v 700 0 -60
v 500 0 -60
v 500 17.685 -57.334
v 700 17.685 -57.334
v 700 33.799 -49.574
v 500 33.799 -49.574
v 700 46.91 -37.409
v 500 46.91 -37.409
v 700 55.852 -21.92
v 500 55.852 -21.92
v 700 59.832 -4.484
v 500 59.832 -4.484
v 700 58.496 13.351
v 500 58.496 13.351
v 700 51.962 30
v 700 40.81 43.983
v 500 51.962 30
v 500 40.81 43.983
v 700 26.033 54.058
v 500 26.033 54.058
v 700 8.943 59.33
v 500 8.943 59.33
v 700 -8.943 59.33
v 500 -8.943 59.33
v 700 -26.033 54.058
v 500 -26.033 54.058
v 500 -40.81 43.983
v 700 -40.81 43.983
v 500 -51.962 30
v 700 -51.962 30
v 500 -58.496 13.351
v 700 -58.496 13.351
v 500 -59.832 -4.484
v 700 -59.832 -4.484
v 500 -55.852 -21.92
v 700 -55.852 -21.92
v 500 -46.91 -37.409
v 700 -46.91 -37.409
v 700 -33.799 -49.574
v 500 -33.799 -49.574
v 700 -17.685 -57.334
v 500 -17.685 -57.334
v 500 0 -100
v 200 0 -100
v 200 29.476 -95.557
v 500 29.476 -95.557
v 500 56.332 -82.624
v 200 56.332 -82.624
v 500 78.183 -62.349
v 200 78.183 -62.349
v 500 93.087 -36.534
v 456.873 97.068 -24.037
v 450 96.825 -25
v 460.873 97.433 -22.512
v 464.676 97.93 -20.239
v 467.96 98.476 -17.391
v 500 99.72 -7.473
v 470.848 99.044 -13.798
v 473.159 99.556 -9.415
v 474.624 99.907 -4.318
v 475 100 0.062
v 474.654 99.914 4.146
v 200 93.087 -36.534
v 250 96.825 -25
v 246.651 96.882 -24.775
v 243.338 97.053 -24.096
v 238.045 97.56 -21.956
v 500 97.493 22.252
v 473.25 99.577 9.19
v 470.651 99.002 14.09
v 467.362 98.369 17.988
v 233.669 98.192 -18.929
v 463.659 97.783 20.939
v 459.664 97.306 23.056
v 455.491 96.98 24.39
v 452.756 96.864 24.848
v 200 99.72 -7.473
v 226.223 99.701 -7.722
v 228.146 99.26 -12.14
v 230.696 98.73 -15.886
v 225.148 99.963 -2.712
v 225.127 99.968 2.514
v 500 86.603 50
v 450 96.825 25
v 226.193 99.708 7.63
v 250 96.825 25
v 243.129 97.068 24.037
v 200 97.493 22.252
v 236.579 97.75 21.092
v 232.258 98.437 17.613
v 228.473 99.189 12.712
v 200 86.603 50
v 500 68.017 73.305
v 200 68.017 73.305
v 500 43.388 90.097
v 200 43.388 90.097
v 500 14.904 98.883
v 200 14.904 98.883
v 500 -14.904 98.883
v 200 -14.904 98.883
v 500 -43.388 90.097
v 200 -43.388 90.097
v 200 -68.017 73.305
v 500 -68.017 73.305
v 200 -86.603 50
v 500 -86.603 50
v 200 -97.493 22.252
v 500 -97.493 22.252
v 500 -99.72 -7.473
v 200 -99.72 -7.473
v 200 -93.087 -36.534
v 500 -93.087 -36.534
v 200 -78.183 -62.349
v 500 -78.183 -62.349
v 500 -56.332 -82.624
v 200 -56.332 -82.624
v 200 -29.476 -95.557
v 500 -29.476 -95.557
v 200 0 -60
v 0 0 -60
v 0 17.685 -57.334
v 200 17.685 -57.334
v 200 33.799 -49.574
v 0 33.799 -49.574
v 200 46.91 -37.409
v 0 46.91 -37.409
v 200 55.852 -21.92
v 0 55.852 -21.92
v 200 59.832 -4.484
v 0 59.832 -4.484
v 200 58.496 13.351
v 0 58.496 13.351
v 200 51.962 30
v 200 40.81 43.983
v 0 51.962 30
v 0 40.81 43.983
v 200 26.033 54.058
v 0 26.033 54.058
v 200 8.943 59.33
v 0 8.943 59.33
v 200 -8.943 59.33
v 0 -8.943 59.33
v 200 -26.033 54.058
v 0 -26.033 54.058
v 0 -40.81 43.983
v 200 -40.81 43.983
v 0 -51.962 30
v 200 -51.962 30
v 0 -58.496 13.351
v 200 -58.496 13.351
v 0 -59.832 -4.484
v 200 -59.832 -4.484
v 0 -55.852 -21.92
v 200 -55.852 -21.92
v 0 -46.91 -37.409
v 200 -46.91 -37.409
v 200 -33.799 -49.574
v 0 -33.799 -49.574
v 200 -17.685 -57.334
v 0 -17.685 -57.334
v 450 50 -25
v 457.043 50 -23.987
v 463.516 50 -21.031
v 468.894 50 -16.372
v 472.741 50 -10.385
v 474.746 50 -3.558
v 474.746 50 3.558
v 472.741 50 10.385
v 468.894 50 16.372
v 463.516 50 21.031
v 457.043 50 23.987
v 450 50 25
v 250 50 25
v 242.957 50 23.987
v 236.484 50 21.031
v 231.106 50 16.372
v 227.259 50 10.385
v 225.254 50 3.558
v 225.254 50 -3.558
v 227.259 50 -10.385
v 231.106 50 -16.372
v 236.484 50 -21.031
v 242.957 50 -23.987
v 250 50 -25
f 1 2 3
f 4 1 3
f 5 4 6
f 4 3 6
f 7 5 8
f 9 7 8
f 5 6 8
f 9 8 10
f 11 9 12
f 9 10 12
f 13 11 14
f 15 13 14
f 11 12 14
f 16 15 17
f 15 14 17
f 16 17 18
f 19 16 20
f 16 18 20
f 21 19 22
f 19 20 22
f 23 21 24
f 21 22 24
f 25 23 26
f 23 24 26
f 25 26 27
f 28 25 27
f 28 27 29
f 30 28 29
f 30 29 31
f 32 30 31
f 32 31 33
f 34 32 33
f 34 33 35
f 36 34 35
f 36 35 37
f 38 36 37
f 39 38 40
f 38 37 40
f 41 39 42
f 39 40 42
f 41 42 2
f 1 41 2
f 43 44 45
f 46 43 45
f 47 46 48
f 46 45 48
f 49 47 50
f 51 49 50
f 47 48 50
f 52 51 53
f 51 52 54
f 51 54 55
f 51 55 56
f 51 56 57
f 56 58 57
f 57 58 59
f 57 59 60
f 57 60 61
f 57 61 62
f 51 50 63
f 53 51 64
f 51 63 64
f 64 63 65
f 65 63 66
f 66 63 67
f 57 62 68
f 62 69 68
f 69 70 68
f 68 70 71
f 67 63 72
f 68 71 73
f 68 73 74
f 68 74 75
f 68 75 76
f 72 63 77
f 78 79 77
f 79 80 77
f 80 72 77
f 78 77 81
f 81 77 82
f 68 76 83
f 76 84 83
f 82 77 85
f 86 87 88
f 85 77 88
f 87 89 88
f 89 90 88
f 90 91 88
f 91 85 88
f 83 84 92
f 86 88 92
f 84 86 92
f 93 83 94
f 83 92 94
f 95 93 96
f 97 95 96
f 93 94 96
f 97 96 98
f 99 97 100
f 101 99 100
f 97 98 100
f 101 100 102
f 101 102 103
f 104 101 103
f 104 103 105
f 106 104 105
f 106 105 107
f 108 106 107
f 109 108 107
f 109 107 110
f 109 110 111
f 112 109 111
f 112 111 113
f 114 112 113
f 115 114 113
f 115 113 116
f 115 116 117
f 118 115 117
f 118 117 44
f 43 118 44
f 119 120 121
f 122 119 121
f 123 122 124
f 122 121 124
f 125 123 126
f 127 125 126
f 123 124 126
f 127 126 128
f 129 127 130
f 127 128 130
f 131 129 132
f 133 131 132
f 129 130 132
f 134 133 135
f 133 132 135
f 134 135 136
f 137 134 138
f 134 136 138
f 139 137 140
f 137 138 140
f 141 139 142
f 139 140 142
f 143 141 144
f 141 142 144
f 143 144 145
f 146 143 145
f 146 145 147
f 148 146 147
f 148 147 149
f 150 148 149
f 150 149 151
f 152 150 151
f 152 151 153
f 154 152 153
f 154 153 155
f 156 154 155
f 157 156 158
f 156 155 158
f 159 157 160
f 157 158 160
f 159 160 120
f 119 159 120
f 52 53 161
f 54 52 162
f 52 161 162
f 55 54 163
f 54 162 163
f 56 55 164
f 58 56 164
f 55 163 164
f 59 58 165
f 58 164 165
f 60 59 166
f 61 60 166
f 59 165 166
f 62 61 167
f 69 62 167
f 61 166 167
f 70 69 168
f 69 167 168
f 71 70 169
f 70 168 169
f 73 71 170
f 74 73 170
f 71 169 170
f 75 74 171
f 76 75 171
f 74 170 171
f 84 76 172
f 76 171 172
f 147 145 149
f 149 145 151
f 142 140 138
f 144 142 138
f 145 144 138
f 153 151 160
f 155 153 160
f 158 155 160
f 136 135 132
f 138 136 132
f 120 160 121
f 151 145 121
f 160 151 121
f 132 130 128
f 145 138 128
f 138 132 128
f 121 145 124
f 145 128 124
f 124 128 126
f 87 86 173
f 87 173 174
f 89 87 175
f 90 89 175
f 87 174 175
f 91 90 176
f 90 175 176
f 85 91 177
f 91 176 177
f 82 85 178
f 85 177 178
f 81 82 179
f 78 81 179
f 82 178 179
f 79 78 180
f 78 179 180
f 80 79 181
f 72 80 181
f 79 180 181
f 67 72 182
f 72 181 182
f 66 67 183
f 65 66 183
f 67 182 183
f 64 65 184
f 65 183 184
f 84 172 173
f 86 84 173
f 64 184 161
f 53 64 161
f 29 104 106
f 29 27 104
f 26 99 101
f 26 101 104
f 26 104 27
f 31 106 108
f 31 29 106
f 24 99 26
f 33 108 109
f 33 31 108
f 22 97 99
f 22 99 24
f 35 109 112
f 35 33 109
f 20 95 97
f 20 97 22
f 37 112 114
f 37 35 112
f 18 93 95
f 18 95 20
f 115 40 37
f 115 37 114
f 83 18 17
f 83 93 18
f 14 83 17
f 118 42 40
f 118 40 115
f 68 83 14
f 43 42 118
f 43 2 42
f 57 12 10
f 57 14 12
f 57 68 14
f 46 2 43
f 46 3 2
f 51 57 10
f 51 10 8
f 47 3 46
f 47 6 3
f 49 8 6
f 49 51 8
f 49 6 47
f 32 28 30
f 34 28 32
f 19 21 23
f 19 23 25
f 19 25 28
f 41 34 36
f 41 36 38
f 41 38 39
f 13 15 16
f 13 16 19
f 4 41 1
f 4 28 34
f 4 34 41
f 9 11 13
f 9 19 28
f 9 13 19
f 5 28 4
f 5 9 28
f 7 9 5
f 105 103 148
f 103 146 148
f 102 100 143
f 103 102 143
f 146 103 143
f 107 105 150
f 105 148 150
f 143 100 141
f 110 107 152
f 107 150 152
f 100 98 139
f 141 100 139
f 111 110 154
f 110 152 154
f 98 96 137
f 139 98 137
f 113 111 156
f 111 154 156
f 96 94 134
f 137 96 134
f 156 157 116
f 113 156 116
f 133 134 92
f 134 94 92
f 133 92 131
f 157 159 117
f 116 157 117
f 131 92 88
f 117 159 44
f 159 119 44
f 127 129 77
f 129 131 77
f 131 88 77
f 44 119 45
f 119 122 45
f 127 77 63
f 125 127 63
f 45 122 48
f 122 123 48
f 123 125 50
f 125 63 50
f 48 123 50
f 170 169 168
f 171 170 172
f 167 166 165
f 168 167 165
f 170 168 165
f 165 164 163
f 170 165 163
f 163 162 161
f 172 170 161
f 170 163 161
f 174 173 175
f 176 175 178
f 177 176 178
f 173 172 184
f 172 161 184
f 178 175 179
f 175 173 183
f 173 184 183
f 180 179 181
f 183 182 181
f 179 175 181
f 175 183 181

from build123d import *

# Parameters (mm, degrees)
IZIM1_R                     = 60
Y_KSEKLIK_EKSTR_ZYON1_DEPTH = 200
IZIM2_R                     = 100
Y_KSEKLIK_EKSTR_ZYON2_DEPTH = 300
IZIM3_R                     = 60
Y_KSEKLIK_EKSTR_ZYON3_DEPTH = 200
KES_EKSTR_ZYON1_DEPTH       = 200


with BuildPart() as part:
    # Çizim1 → Yükseklik-Ekstrüzyon1 (new body)
    with BuildSketch(Plane(origin=(0, 0, 0), x_dir=(0, 0, -1), z_dir=(1, 0, 0))):
        Circle(IZIM1_R)
    extrude(amount=Y_KSEKLIK_EKSTR_ZYON1_DEPTH)

    # Çizim2 → Yükseklik-Ekstrüzyon2 (add)
    with BuildSketch(Plane(origin=(200, 0, 0), x_dir=(0, 0, -1), z_dir=(1, 0, 0))):
        Circle(IZIM2_R)
    extrude(amount=Y_KSEKLIK_EKSTR_ZYON2_DEPTH)

    # Çizim3 → Yükseklik-Ekstrüzyon3 (add)
    with BuildSketch(Plane(origin=(500, 0, 0), x_dir=(0, 0, -1), z_dir=(1, 0, 0))):
        Circle(IZIM3_R)
    extrude(amount=Y_KSEKLIK_EKSTR_ZYON3_DEPTH)

    # Çizim4 → Kes-Ekstrüzyon1 (cut)
    with BuildSketch(Plane(origin=(0, 50, 0), x_dir=(1, 0, 0), z_dir=(0, 1, 0))):
        with BuildLine():
            Line((250, 25), (450, 25))
            ThreePointArc((450, 25), (475, 0), (450, -25))
            Line((450, -25), (250, -25))
            ThreePointArc((250, -25), (225, 0), (250, 25))
        make_face()
    extrude(amount=KES_EKSTR_ZYON1_DEPTH, mode=Mode.SUBTRACT)


solid = part.part
